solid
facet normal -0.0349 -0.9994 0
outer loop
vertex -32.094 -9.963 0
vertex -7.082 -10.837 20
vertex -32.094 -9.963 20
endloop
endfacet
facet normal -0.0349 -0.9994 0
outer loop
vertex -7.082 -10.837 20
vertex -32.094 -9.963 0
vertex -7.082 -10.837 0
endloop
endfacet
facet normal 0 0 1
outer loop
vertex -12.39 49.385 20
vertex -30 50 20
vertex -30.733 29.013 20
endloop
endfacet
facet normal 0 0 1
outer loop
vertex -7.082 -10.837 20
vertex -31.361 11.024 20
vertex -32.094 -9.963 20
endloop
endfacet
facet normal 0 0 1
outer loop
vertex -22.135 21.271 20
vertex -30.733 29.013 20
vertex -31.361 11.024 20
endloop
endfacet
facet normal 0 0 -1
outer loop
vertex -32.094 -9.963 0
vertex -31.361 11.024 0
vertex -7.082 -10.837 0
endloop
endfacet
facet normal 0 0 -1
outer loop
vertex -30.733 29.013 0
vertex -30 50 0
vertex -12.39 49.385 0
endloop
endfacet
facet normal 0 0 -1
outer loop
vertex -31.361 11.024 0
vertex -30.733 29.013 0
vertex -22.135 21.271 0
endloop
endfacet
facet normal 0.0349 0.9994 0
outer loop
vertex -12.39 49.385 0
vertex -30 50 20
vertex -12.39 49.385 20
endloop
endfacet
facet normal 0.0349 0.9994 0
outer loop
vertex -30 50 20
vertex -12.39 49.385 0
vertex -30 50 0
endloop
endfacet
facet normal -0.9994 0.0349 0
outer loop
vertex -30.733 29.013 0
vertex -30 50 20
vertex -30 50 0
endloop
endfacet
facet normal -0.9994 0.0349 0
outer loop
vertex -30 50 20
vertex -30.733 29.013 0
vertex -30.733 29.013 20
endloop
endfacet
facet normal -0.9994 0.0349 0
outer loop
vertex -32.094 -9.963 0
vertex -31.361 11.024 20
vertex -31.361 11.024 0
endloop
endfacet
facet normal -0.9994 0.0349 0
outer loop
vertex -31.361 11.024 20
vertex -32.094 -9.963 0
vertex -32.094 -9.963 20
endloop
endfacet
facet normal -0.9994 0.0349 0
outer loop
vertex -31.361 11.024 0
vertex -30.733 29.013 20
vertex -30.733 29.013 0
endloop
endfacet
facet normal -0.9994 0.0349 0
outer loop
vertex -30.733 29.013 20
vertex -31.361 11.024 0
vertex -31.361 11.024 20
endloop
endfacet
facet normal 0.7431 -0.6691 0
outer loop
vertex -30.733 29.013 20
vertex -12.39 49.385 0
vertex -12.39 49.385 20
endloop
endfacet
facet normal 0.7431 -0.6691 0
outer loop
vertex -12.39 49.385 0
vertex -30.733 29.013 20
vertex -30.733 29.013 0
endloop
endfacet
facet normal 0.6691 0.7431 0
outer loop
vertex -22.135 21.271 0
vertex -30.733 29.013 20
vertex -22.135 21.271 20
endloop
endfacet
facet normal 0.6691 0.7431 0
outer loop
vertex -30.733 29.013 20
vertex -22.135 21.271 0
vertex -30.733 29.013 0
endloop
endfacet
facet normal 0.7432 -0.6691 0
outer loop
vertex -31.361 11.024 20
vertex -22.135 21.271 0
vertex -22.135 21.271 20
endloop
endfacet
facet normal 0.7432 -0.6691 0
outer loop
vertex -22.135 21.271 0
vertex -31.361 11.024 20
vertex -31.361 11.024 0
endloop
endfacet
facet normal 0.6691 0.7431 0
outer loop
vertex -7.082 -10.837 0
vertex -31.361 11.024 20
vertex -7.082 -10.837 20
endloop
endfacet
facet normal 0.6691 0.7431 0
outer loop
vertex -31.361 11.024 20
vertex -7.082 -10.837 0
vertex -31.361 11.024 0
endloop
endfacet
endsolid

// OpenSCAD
translate([-30,50,0])
scale([3,3,1])
rotate([0,0,-92]) {
    difference() {
        cube([20, 20, 20]);
        translate([7, 0, -1]) {
            rotate([0,0,50]) {
                cube([30, 30, 30]);
            }
        }
        translate([13, 0, -1]) {
            rotate([0,0,50]) {
                cube([30, 30, 30]);
            }
        }
    }
}
